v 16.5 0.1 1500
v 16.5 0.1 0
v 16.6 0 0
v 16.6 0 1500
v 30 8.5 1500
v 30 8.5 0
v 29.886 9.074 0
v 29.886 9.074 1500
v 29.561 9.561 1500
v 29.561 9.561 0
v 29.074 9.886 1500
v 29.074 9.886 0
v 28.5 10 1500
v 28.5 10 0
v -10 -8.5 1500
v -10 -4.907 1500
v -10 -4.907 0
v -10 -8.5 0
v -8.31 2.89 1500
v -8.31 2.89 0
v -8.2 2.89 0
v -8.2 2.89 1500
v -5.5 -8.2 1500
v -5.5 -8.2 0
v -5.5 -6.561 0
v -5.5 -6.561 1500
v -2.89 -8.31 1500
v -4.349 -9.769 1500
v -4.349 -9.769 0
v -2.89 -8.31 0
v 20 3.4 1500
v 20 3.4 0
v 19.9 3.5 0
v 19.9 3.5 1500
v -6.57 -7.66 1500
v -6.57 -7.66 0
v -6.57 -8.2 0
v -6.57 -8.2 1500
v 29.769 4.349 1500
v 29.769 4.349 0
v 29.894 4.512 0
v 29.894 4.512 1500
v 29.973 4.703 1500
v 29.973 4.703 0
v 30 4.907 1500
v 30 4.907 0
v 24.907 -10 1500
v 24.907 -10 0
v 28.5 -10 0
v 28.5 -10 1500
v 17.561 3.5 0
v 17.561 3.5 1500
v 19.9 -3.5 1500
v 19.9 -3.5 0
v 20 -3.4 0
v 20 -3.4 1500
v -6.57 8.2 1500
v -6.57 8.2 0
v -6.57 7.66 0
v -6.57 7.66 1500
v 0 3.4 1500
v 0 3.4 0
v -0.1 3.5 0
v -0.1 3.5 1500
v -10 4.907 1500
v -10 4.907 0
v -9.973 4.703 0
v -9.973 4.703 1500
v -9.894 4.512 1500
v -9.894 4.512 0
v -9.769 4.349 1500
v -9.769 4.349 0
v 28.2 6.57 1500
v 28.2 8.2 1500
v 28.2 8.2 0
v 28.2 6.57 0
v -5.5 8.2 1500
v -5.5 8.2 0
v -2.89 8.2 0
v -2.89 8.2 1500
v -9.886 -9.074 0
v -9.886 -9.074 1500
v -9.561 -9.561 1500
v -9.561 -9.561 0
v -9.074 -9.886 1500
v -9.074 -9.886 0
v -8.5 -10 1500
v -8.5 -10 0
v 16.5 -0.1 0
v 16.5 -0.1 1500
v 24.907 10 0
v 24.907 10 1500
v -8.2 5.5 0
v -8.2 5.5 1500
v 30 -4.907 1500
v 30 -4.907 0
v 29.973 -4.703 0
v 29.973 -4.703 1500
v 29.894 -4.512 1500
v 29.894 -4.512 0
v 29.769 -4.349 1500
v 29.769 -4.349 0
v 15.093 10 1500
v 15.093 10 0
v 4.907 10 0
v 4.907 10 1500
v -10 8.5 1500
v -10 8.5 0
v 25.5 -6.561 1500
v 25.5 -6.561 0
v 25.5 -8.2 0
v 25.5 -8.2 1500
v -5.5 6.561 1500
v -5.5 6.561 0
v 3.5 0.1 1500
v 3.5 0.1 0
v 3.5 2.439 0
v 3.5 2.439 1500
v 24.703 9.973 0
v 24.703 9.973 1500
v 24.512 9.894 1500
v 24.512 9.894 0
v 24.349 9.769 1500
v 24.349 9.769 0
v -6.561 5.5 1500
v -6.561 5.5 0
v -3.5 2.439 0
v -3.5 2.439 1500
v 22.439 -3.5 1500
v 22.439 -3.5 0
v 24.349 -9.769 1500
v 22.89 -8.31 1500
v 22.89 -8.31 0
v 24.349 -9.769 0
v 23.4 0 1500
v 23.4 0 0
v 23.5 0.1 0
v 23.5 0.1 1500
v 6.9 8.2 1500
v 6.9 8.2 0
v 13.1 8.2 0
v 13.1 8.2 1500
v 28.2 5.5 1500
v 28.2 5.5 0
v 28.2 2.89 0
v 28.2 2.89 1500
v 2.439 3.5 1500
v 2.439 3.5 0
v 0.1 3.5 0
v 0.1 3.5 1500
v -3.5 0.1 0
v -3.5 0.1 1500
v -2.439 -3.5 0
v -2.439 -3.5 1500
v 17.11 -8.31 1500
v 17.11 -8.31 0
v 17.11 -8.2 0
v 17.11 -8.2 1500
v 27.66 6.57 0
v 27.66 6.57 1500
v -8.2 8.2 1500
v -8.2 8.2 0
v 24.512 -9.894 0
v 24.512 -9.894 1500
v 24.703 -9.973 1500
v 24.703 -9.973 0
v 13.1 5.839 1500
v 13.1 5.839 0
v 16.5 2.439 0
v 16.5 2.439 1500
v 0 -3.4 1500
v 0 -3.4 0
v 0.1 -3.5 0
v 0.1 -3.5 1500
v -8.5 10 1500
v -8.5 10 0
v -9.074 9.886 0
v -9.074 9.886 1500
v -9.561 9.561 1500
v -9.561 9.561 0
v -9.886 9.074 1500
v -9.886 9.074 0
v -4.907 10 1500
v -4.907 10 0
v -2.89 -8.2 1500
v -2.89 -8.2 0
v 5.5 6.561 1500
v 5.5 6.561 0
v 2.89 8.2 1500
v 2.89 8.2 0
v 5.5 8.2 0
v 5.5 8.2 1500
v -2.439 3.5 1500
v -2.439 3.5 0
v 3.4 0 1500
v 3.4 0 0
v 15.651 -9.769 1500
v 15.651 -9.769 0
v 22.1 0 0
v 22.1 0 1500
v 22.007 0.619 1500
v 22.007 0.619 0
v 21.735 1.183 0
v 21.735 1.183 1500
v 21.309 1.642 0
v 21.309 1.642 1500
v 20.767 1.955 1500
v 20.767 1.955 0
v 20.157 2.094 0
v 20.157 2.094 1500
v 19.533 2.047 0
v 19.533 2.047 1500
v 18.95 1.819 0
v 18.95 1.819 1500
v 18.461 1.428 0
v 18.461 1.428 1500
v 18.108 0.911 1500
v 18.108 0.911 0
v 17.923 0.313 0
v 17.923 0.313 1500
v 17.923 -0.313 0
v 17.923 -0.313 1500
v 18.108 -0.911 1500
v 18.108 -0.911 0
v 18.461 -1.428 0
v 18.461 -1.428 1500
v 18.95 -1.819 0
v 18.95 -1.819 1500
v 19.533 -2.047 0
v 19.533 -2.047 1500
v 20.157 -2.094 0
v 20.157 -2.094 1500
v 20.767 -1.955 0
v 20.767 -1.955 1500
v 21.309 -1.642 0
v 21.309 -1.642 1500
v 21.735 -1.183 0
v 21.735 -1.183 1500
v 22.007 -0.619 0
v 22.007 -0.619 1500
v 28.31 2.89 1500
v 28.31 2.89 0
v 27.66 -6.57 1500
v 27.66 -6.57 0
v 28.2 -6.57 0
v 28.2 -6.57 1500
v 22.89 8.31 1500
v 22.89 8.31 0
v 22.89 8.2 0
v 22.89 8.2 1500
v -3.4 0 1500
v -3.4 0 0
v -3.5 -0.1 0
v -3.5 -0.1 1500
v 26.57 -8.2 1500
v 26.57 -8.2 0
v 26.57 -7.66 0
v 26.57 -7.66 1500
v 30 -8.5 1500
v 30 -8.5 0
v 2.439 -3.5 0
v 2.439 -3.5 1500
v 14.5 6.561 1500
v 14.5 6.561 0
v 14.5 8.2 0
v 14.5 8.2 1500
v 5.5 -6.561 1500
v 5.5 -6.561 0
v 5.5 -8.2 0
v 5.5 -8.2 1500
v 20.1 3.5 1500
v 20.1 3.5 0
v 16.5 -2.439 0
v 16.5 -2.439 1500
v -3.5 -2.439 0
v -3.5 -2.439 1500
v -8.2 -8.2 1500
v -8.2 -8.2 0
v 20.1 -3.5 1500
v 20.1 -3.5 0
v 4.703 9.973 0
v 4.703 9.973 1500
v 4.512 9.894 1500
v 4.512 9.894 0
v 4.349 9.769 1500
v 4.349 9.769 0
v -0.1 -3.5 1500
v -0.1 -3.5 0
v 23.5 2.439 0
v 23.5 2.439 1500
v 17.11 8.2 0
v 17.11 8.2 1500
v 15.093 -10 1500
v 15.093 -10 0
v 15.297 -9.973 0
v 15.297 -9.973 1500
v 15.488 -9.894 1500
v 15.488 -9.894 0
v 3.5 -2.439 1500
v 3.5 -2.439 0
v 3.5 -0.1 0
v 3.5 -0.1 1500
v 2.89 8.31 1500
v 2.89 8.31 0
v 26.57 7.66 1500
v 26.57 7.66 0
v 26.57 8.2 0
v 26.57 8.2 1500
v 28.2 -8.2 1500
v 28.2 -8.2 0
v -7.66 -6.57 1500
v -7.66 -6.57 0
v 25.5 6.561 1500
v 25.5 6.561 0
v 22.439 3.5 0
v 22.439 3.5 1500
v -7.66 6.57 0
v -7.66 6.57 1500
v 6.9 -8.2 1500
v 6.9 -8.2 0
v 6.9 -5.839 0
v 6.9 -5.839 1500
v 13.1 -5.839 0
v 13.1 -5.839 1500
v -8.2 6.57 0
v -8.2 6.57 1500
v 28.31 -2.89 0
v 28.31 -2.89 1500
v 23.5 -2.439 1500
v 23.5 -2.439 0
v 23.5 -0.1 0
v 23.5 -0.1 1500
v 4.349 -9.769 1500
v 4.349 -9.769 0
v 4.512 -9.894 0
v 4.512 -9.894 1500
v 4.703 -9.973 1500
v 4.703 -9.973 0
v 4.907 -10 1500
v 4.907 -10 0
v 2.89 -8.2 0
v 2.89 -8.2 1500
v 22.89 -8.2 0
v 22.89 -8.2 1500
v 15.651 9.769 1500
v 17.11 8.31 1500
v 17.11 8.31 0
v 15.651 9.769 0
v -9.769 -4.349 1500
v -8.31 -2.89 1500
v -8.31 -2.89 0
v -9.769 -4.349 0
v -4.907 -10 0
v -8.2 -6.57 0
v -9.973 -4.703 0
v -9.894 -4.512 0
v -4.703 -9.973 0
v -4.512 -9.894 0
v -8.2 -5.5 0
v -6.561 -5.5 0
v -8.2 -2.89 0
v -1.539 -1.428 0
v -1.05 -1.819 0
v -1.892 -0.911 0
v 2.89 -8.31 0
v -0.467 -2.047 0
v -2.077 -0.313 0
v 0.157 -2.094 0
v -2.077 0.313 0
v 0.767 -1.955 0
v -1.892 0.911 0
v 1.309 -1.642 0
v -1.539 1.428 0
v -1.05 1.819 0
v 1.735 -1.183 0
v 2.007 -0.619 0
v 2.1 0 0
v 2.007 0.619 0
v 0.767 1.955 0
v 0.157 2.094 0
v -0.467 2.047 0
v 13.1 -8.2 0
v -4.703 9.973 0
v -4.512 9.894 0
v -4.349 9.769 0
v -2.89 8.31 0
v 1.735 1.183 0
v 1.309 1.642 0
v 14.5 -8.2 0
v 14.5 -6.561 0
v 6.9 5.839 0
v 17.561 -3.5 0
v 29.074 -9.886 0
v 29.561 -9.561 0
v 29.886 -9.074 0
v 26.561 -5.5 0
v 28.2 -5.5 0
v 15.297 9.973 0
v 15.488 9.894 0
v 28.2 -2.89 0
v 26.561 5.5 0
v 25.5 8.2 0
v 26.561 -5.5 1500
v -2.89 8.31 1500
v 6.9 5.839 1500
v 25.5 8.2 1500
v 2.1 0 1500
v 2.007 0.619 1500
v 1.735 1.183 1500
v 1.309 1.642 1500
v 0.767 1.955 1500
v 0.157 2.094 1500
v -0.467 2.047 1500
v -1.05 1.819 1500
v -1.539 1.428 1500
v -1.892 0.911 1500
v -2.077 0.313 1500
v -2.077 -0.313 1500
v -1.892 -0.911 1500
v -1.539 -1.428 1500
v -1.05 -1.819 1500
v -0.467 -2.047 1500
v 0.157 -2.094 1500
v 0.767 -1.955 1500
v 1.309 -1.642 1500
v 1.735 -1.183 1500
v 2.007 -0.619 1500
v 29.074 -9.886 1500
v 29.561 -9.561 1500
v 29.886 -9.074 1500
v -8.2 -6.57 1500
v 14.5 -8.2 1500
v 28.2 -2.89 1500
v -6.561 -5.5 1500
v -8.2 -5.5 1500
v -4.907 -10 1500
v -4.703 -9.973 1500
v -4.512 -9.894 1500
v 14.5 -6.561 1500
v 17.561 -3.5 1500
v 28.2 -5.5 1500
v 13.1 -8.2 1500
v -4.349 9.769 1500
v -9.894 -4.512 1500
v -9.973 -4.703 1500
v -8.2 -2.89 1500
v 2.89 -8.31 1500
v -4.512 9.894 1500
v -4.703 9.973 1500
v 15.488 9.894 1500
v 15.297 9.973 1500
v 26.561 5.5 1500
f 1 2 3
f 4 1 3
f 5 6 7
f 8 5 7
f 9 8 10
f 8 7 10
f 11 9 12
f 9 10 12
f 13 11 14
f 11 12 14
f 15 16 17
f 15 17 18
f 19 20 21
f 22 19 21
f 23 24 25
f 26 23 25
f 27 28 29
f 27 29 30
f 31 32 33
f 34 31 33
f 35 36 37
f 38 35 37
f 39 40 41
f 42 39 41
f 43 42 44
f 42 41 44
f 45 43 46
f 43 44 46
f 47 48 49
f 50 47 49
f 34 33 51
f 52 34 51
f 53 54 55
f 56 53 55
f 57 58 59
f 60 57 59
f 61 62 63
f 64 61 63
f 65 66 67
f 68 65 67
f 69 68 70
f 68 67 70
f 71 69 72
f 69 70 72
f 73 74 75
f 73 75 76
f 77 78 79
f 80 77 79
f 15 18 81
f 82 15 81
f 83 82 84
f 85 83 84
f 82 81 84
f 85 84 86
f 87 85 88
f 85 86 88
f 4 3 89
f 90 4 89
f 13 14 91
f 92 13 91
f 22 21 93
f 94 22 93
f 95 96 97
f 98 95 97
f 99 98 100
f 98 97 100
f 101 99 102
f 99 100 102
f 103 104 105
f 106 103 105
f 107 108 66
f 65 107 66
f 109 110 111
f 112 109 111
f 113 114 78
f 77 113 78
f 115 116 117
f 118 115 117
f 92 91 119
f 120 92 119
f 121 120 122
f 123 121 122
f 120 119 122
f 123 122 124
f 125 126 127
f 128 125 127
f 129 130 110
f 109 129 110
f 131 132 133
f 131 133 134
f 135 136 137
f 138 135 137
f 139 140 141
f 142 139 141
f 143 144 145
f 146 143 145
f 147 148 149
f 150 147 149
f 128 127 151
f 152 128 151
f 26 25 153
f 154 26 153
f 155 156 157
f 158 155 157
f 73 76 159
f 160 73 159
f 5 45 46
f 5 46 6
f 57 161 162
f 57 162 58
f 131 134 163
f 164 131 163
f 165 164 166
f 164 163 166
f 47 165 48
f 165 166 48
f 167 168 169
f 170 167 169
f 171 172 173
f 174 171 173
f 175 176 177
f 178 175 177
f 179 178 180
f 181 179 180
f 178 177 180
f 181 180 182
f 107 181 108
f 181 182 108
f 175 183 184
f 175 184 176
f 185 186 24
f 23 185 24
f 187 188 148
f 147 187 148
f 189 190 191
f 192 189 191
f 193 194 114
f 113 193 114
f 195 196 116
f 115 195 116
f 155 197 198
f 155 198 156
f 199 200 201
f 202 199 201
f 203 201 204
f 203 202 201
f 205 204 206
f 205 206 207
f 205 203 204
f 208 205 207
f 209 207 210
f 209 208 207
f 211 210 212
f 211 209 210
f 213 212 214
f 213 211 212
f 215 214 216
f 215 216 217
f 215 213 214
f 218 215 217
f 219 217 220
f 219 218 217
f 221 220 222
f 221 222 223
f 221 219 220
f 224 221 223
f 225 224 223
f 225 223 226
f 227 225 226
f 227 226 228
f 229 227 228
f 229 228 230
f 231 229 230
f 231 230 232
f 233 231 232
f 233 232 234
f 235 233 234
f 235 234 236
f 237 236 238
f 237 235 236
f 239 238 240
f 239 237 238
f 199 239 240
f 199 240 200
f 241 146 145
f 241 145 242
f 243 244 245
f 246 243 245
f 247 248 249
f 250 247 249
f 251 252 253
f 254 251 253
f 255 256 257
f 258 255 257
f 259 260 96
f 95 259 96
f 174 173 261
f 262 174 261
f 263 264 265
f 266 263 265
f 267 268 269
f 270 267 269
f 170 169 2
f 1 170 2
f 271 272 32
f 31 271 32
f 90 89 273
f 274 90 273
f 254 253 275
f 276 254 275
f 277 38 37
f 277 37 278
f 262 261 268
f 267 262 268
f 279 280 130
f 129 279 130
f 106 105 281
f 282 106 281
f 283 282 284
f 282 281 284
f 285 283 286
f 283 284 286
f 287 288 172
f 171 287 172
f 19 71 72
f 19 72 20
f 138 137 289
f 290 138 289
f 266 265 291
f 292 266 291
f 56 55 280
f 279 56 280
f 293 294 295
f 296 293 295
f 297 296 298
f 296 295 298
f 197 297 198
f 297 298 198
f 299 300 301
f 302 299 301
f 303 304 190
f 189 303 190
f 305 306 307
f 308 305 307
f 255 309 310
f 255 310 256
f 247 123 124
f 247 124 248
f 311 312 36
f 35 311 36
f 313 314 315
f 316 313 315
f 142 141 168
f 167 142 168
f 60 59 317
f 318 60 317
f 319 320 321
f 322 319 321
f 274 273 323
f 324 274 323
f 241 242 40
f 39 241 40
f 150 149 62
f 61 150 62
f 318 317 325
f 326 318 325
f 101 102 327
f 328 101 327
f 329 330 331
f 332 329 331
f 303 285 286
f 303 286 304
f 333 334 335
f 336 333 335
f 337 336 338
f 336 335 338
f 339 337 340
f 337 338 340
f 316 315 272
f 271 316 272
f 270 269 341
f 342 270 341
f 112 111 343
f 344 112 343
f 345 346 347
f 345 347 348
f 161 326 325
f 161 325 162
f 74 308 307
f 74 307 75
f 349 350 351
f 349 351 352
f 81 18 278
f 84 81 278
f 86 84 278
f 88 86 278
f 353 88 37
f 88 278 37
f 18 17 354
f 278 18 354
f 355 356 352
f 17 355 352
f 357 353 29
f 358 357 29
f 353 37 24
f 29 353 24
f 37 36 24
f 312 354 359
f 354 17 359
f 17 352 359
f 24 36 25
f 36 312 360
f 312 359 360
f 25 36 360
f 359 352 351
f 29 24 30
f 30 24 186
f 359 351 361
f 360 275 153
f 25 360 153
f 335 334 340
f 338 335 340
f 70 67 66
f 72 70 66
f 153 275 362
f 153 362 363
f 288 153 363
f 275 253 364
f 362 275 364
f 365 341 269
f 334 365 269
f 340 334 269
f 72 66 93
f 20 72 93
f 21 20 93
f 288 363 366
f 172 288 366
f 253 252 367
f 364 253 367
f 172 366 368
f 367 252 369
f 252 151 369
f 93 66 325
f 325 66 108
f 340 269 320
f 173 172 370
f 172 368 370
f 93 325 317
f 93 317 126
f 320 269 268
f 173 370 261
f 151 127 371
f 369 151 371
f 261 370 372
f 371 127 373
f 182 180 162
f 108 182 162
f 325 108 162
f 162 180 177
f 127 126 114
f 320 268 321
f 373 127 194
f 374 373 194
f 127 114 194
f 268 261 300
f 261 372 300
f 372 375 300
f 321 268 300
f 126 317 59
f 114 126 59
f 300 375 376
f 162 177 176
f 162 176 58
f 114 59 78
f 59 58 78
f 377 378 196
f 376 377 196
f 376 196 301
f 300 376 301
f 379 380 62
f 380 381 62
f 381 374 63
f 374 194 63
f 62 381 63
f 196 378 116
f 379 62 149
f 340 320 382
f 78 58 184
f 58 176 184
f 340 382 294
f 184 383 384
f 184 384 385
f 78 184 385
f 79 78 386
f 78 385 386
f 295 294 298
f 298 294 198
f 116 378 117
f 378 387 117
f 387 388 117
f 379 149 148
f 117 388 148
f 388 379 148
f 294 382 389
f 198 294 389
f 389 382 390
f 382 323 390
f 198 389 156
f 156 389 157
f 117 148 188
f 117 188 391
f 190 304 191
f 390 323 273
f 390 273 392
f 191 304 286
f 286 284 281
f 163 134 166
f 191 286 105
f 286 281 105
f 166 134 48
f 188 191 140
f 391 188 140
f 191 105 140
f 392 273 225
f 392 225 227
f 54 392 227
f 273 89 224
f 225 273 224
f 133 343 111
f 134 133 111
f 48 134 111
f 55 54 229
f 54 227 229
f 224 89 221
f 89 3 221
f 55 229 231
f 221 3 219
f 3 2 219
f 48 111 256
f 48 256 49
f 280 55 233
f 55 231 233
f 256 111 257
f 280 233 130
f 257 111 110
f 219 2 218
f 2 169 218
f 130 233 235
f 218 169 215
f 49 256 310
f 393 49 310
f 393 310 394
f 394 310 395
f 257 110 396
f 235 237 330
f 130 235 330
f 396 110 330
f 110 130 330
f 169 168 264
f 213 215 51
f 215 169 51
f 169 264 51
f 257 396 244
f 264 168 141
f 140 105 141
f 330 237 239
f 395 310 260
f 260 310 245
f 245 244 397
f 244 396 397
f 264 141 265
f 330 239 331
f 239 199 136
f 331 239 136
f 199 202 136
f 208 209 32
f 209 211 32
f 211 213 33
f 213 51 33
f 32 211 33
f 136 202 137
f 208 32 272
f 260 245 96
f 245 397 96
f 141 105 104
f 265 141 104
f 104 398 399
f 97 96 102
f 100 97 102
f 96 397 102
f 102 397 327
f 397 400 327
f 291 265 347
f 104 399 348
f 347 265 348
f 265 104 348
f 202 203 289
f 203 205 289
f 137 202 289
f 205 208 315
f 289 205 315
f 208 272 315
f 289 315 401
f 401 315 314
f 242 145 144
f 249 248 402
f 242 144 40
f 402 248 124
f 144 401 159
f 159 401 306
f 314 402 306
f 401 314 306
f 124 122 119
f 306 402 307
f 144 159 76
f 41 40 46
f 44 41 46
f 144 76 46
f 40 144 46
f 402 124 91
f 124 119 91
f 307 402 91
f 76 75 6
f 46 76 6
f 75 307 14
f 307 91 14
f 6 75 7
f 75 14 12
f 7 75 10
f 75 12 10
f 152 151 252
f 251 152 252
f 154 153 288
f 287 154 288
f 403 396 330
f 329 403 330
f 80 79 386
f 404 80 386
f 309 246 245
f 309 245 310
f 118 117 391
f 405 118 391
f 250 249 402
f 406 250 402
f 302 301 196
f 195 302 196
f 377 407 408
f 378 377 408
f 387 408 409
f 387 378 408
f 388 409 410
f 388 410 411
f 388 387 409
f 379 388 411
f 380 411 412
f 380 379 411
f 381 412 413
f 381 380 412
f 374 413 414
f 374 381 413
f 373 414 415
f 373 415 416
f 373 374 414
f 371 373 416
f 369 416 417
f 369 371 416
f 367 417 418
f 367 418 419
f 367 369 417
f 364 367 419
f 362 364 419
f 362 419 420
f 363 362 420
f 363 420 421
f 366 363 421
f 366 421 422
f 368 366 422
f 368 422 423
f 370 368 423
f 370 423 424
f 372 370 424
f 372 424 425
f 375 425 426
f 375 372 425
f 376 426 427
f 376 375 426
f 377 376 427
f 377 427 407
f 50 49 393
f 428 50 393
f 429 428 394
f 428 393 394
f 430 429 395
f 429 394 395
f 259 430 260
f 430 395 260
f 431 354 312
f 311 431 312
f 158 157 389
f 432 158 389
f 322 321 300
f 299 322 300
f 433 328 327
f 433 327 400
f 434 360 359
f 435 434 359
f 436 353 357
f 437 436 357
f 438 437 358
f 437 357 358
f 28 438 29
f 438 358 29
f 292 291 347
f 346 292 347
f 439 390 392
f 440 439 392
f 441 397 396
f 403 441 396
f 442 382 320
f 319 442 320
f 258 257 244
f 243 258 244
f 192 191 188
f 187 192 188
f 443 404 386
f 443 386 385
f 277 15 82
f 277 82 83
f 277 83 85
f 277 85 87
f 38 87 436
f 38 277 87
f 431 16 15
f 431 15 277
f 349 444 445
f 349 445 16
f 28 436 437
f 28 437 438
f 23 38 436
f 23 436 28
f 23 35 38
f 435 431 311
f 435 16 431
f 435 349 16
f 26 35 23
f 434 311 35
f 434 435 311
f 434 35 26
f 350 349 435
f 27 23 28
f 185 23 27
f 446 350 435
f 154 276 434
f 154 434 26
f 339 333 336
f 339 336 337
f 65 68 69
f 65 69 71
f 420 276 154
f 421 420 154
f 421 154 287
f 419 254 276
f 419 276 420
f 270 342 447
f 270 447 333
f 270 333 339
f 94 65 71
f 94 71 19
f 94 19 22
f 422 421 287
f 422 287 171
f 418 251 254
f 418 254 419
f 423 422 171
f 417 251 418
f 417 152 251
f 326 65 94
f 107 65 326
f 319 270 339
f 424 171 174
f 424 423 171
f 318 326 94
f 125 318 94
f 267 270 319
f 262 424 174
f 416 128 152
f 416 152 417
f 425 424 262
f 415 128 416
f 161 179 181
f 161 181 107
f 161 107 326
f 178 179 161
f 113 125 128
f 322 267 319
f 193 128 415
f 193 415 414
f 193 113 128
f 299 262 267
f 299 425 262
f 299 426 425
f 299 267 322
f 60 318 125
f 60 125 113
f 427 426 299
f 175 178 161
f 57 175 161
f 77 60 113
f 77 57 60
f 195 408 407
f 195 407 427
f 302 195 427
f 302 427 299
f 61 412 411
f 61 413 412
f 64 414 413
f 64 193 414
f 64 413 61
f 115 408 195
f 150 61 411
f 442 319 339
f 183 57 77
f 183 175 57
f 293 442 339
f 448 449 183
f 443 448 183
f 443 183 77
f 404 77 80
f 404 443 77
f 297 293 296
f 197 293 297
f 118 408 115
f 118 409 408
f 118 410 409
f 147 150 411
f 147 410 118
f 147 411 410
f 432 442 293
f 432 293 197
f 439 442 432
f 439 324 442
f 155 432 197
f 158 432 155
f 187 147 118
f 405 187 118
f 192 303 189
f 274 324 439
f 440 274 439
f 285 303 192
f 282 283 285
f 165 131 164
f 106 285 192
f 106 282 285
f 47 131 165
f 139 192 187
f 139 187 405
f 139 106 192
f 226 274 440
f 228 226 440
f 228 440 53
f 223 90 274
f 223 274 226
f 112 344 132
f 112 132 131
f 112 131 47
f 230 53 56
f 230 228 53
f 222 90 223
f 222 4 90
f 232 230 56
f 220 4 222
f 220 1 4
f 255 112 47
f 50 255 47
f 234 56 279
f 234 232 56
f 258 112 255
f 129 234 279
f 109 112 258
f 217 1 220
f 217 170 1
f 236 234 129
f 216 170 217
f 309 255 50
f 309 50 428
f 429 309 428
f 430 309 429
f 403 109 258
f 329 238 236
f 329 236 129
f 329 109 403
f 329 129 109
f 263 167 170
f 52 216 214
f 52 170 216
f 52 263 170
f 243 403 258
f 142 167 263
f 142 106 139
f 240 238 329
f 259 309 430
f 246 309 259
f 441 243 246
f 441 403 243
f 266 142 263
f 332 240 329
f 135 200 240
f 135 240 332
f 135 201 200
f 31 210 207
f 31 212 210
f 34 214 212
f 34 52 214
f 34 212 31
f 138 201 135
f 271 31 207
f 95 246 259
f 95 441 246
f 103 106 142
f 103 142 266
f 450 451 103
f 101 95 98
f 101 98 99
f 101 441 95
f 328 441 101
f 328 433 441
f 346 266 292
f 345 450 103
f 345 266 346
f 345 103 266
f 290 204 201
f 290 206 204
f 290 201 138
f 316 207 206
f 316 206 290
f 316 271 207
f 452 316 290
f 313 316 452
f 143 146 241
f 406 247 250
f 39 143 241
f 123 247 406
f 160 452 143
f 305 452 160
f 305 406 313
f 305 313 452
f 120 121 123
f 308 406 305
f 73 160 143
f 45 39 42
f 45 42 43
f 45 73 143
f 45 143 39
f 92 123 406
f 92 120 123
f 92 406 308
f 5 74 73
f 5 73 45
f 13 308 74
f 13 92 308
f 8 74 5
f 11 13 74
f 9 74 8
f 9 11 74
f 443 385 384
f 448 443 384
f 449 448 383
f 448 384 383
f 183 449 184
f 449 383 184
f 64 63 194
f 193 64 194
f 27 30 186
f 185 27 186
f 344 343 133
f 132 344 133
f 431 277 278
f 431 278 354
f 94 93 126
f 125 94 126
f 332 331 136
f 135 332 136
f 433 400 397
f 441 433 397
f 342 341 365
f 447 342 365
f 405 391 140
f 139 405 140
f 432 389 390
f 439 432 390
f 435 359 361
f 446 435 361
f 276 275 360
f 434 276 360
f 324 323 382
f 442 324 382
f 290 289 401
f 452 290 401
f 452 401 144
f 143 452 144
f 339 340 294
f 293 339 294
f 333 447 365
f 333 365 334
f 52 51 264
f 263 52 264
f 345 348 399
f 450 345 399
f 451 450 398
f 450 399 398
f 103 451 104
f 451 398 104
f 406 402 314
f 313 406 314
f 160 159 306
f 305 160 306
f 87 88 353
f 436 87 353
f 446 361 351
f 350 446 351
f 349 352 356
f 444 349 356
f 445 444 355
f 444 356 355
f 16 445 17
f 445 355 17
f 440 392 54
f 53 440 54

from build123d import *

# Parameters (mm, degrees)
F0_R     = 2.1
F1_DEPTH = 1500


with BuildPart() as f1:
    # F0 (on Top) → F1 (new body)
    with BuildSketch(Plane.XY):
        with BuildLine():
            Line((-3.4, 0), (-3.5, -0.1))
            Line((-3.5, -0.1), (-3.5, -2.43934))
            Line((-3.5, -2.43934), (-6.56066, -5.5))
            Line((-6.56066, -5.5), (-8.2, -5.5))
            Line((-8.2, -5.5), (-8.2, -2.89))
            Line((-8.2, -2.89), (-8.31, -2.89))
            Line((-8.31, -2.89), (-9.768614, -4.348614))
            ThreePointArc((-9.768614, -4.348614), (-9.939865, -4.604909), (-10, -4.907229))
            Line((-10, -4.907229), (-10, -8.5))
            ThreePointArc((-10, -8.5), (-9.56066, -9.56066), (-8.5, -10))
            Line((-8.5, -10), (-4.907229, -10))
            ThreePointArc((-4.907229, -10), (-4.604909, -9.939865), (-4.348614, -9.768614))
            Line((-4.348614, -9.768614), (-2.89, -8.31))
            Line((-2.89, -8.31), (-2.89, -8.2))
            Line((-2.89, -8.2), (-5.5, -8.2))
            Line((-5.5, -8.2), (-5.5, -6.56066))
            Line((-5.5, -6.56066), (-2.43934, -3.5))
            Line((-2.43934, -3.5), (-0.1, -3.5))
            Line((-0.1, -3.5), (0, -3.4))
            Line((0, -3.4), (0.1, -3.5))
            Line((0.1, -3.5), (2.43934, -3.5))
            Line((2.43934, -3.5), (5.5, -6.56066))
            Line((5.5, -6.56066), (5.5, -8.2))
            Line((5.5, -8.2), (2.89, -8.2))
            Line((2.89, -8.2), (2.89, -8.31))
            Line((2.89, -8.31), (4.348614, -9.768614))
            ThreePointArc((4.348614, -9.768614), (4.604909, -9.939865), (4.907229, -10))
            Line((4.907229, -10), (10, -10))
            Line((10, -10), (15.092771, -10))
            ThreePointArc((15.092771, -10), (15.395091, -9.939865), (15.651386, -9.768614))
            Line((15.651386, -9.768614), (17.11, -8.31))
            Line((17.11, -8.31), (17.11, -8.2))
            Line((17.11, -8.2), (14.5, -8.2))
            Line((14.5, -8.2), (14.5, -6.56066))
            Line((14.5, -6.56066), (17.56066, -3.5))
            Line((17.56066, -3.5), (19.9, -3.5))
            Line((19.9, -3.5), (20, -3.4))
            Line((20, -3.4), (20.1, -3.5))
            Line((20.1, -3.5), (22.43934, -3.5))
            Line((22.43934, -3.5), (25.5, -6.56066))
            Line((25.5, -6.56066), (25.5, -8.2))
            Line((25.5, -8.2), (22.89, -8.2))
            Line((22.89, -8.2), (22.89, -8.31))
            Line((22.89, -8.31), (24.348614, -9.768614))
            ThreePointArc((24.348614, -9.768614), (24.604909, -9.939865), (24.907229, -10))
            Line((24.907229, -10), (28.5, -10))
            ThreePointArc((28.5, -10), (29.56066, -9.56066), (30, -8.5))
            Line((30, -8.5), (30, -4.907229))
            ThreePointArc((30, -4.907229), (29.939865, -4.604909), (29.768614, -4.348614))
            Line((29.768614, -4.348614), (28.31, -2.89))
            Line((28.31, -2.89), (28.2, -2.89))
            Line((28.2, -2.89), (28.2, -5.5))
            Line((28.2, -5.5), (26.56066, -5.5))
            Line((26.56066, -5.5), (23.5, -2.43934))
            Line((23.5, -2.43934), (23.5, -0.1))
            Line((23.5, -0.1), (23.4, 0))
            Line((23.4, 0), (23.5, 0.1))
            Line((23.5, 0.1), (23.5, 2.43934))
            Line((23.5, 2.43934), (26.56066, 5.5))
            Line((26.56066, 5.5), (28.2, 5.5))
            Line((28.2, 5.5), (28.2, 2.89))
            Line((28.2, 2.89), (28.31, 2.89))
            Line((28.31, 2.89), (29.768614, 4.348614))
            ThreePointArc((29.768614, 4.348614), (29.939865, 4.604909), (30, 4.907229))
            Line((30, 4.907229), (30, 8.5))
            ThreePointArc((30, 8.5), (29.56066, 9.56066), (28.5, 10))
            Line((28.5, 10), (24.907229, 10))
            ThreePointArc((24.907229, 10), (24.604909, 9.939865), (24.348614, 9.768614))
            Line((24.348614, 9.768614), (22.89, 8.31))
            Line((22.89, 8.31), (22.89, 8.2))
            Line((22.89, 8.2), (25.5, 8.2))
            Line((25.5, 8.2), (25.5, 6.56066))
            Line((25.5, 6.56066), (22.43934, 3.5))
            Line((22.43934, 3.5), (20.1, 3.5))
            Line((20.1, 3.5), (20, 3.4))
            Line((20, 3.4), (19.9, 3.5))
            Line((19.9, 3.5), (17.56066, 3.5))
            Line((17.56066, 3.5), (14.5, 6.56066))
            Line((14.5, 6.56066), (14.5, 8.2))
            Line((14.5, 8.2), (17.11, 8.2))
            Line((17.11, 8.2), (17.11, 8.31))
            Line((17.11, 8.31), (15.651386, 9.768614))
            ThreePointArc((15.651386, 9.768614), (15.395091, 9.939865), (15.092771, 10))
            Line((15.092771, 10), (10, 10))
            Line((10, 10), (4.907229, 10))
            ThreePointArc((4.907229, 10), (4.604909, 9.939865), (4.348614, 9.768614))
            Line((4.348614, 9.768614), (2.89, 8.31))
            Line((2.89, 8.31), (2.89, 8.2))
            Line((2.89, 8.2), (5.5, 8.2))
            Line((5.5, 8.2), (5.5, 6.56066))
            Line((5.5, 6.56066), (2.43934, 3.5))
            Line((2.43934, 3.5), (0.1, 3.5))
            Line((0.1, 3.5), (0, 3.4))
            Line((0, 3.4), (-0.1, 3.5))
            Line((-0.1, 3.5), (-2.43934, 3.5))
            Line((-2.43934, 3.5), (-5.5, 6.56066))
            Line((-5.5, 6.56066), (-5.5, 8.2))
            Line((-5.5, 8.2), (-2.89, 8.2))
            Line((-2.89, 8.2), (-2.89, 8.31))
            Line((-2.89, 8.31), (-4.348614, 9.768614))
            ThreePointArc((-4.348614, 9.768614), (-4.604909, 9.939865), (-4.907229, 10))
            Line((-4.907229, 10), (-8.5, 10))
            ThreePointArc((-8.5, 10), (-9.56066, 9.56066), (-10, 8.5))
            Line((-10, 8.5), (-10, 4.907229))
            ThreePointArc((-10, 4.907229), (-9.939865, 4.604909), (-9.768614, 4.348614))
            Line((-9.768614, 4.348614), (-8.31, 2.89))
            Line((-8.31, 2.89), (-8.2, 2.89))
            Line((-8.2, 2.89), (-8.2, 5.5))
            Line((-8.2, 5.5), (-6.56066, 5.5))
            Line((-6.56066, 5.5), (-3.5, 2.43934))
            Line((-3.5, 2.43934), (-3.5, 0.1))
            Line((-3.5, 0.1), (-3.4, 0))
        make_face()
        Polygon((-7.66, -6.57), (-7.115, -7.115), (-6.57, -7.66), (-6.57, -8.2), (-8.2, -8.2), (-8.2, -6.57), align=None, mode=Mode.SUBTRACT)
        Polygon((27.115, -7.115), (27.66, -6.57), (28.2, -6.57), (28.2, -8.2), (26.57, -8.2), (26.57, -7.66), align=None, mode=Mode.SUBTRACT)
        Circle(F0_R, mode=Mode.SUBTRACT)
        Polygon((-6.57, 8.2), (-6.57, 7.66), (-7.115, 7.115), (-7.66, 6.57), (-8.2, 6.57), (-8.2, 8.2), align=None, mode=Mode.SUBTRACT)
        Polygon((3.5, -2.43934), (3.5, -0.1), (3.4, 0), (3.5, 0.1), (3.5, 2.43934), (6.9, 5.83934), (6.9, 8.2), (10, 8.2), (13.1, 8.2), (13.1, 5.83934), (16.5, 2.43934), (16.5, 0.1), (16.6, 0), (16.5, -0.1), (16.5, -2.43934), (13.1, -5.83934), (13.1, -8.2), (10, -8.2), (6.9, -8.2), (6.9, -5.83934), align=None, mode=Mode.SUBTRACT)
        with Locations((20, 0)):
            Circle(F0_R, mode=Mode.SUBTRACT)
        Polygon((27.66, 6.57), (27.115, 7.115), (26.57, 7.66), (26.57, 8.2), (28.2, 8.2), (28.2, 6.57), align=None, mode=Mode.SUBTRACT)
    extrude(amount=F1_DEPTH)


solid = f1.part
